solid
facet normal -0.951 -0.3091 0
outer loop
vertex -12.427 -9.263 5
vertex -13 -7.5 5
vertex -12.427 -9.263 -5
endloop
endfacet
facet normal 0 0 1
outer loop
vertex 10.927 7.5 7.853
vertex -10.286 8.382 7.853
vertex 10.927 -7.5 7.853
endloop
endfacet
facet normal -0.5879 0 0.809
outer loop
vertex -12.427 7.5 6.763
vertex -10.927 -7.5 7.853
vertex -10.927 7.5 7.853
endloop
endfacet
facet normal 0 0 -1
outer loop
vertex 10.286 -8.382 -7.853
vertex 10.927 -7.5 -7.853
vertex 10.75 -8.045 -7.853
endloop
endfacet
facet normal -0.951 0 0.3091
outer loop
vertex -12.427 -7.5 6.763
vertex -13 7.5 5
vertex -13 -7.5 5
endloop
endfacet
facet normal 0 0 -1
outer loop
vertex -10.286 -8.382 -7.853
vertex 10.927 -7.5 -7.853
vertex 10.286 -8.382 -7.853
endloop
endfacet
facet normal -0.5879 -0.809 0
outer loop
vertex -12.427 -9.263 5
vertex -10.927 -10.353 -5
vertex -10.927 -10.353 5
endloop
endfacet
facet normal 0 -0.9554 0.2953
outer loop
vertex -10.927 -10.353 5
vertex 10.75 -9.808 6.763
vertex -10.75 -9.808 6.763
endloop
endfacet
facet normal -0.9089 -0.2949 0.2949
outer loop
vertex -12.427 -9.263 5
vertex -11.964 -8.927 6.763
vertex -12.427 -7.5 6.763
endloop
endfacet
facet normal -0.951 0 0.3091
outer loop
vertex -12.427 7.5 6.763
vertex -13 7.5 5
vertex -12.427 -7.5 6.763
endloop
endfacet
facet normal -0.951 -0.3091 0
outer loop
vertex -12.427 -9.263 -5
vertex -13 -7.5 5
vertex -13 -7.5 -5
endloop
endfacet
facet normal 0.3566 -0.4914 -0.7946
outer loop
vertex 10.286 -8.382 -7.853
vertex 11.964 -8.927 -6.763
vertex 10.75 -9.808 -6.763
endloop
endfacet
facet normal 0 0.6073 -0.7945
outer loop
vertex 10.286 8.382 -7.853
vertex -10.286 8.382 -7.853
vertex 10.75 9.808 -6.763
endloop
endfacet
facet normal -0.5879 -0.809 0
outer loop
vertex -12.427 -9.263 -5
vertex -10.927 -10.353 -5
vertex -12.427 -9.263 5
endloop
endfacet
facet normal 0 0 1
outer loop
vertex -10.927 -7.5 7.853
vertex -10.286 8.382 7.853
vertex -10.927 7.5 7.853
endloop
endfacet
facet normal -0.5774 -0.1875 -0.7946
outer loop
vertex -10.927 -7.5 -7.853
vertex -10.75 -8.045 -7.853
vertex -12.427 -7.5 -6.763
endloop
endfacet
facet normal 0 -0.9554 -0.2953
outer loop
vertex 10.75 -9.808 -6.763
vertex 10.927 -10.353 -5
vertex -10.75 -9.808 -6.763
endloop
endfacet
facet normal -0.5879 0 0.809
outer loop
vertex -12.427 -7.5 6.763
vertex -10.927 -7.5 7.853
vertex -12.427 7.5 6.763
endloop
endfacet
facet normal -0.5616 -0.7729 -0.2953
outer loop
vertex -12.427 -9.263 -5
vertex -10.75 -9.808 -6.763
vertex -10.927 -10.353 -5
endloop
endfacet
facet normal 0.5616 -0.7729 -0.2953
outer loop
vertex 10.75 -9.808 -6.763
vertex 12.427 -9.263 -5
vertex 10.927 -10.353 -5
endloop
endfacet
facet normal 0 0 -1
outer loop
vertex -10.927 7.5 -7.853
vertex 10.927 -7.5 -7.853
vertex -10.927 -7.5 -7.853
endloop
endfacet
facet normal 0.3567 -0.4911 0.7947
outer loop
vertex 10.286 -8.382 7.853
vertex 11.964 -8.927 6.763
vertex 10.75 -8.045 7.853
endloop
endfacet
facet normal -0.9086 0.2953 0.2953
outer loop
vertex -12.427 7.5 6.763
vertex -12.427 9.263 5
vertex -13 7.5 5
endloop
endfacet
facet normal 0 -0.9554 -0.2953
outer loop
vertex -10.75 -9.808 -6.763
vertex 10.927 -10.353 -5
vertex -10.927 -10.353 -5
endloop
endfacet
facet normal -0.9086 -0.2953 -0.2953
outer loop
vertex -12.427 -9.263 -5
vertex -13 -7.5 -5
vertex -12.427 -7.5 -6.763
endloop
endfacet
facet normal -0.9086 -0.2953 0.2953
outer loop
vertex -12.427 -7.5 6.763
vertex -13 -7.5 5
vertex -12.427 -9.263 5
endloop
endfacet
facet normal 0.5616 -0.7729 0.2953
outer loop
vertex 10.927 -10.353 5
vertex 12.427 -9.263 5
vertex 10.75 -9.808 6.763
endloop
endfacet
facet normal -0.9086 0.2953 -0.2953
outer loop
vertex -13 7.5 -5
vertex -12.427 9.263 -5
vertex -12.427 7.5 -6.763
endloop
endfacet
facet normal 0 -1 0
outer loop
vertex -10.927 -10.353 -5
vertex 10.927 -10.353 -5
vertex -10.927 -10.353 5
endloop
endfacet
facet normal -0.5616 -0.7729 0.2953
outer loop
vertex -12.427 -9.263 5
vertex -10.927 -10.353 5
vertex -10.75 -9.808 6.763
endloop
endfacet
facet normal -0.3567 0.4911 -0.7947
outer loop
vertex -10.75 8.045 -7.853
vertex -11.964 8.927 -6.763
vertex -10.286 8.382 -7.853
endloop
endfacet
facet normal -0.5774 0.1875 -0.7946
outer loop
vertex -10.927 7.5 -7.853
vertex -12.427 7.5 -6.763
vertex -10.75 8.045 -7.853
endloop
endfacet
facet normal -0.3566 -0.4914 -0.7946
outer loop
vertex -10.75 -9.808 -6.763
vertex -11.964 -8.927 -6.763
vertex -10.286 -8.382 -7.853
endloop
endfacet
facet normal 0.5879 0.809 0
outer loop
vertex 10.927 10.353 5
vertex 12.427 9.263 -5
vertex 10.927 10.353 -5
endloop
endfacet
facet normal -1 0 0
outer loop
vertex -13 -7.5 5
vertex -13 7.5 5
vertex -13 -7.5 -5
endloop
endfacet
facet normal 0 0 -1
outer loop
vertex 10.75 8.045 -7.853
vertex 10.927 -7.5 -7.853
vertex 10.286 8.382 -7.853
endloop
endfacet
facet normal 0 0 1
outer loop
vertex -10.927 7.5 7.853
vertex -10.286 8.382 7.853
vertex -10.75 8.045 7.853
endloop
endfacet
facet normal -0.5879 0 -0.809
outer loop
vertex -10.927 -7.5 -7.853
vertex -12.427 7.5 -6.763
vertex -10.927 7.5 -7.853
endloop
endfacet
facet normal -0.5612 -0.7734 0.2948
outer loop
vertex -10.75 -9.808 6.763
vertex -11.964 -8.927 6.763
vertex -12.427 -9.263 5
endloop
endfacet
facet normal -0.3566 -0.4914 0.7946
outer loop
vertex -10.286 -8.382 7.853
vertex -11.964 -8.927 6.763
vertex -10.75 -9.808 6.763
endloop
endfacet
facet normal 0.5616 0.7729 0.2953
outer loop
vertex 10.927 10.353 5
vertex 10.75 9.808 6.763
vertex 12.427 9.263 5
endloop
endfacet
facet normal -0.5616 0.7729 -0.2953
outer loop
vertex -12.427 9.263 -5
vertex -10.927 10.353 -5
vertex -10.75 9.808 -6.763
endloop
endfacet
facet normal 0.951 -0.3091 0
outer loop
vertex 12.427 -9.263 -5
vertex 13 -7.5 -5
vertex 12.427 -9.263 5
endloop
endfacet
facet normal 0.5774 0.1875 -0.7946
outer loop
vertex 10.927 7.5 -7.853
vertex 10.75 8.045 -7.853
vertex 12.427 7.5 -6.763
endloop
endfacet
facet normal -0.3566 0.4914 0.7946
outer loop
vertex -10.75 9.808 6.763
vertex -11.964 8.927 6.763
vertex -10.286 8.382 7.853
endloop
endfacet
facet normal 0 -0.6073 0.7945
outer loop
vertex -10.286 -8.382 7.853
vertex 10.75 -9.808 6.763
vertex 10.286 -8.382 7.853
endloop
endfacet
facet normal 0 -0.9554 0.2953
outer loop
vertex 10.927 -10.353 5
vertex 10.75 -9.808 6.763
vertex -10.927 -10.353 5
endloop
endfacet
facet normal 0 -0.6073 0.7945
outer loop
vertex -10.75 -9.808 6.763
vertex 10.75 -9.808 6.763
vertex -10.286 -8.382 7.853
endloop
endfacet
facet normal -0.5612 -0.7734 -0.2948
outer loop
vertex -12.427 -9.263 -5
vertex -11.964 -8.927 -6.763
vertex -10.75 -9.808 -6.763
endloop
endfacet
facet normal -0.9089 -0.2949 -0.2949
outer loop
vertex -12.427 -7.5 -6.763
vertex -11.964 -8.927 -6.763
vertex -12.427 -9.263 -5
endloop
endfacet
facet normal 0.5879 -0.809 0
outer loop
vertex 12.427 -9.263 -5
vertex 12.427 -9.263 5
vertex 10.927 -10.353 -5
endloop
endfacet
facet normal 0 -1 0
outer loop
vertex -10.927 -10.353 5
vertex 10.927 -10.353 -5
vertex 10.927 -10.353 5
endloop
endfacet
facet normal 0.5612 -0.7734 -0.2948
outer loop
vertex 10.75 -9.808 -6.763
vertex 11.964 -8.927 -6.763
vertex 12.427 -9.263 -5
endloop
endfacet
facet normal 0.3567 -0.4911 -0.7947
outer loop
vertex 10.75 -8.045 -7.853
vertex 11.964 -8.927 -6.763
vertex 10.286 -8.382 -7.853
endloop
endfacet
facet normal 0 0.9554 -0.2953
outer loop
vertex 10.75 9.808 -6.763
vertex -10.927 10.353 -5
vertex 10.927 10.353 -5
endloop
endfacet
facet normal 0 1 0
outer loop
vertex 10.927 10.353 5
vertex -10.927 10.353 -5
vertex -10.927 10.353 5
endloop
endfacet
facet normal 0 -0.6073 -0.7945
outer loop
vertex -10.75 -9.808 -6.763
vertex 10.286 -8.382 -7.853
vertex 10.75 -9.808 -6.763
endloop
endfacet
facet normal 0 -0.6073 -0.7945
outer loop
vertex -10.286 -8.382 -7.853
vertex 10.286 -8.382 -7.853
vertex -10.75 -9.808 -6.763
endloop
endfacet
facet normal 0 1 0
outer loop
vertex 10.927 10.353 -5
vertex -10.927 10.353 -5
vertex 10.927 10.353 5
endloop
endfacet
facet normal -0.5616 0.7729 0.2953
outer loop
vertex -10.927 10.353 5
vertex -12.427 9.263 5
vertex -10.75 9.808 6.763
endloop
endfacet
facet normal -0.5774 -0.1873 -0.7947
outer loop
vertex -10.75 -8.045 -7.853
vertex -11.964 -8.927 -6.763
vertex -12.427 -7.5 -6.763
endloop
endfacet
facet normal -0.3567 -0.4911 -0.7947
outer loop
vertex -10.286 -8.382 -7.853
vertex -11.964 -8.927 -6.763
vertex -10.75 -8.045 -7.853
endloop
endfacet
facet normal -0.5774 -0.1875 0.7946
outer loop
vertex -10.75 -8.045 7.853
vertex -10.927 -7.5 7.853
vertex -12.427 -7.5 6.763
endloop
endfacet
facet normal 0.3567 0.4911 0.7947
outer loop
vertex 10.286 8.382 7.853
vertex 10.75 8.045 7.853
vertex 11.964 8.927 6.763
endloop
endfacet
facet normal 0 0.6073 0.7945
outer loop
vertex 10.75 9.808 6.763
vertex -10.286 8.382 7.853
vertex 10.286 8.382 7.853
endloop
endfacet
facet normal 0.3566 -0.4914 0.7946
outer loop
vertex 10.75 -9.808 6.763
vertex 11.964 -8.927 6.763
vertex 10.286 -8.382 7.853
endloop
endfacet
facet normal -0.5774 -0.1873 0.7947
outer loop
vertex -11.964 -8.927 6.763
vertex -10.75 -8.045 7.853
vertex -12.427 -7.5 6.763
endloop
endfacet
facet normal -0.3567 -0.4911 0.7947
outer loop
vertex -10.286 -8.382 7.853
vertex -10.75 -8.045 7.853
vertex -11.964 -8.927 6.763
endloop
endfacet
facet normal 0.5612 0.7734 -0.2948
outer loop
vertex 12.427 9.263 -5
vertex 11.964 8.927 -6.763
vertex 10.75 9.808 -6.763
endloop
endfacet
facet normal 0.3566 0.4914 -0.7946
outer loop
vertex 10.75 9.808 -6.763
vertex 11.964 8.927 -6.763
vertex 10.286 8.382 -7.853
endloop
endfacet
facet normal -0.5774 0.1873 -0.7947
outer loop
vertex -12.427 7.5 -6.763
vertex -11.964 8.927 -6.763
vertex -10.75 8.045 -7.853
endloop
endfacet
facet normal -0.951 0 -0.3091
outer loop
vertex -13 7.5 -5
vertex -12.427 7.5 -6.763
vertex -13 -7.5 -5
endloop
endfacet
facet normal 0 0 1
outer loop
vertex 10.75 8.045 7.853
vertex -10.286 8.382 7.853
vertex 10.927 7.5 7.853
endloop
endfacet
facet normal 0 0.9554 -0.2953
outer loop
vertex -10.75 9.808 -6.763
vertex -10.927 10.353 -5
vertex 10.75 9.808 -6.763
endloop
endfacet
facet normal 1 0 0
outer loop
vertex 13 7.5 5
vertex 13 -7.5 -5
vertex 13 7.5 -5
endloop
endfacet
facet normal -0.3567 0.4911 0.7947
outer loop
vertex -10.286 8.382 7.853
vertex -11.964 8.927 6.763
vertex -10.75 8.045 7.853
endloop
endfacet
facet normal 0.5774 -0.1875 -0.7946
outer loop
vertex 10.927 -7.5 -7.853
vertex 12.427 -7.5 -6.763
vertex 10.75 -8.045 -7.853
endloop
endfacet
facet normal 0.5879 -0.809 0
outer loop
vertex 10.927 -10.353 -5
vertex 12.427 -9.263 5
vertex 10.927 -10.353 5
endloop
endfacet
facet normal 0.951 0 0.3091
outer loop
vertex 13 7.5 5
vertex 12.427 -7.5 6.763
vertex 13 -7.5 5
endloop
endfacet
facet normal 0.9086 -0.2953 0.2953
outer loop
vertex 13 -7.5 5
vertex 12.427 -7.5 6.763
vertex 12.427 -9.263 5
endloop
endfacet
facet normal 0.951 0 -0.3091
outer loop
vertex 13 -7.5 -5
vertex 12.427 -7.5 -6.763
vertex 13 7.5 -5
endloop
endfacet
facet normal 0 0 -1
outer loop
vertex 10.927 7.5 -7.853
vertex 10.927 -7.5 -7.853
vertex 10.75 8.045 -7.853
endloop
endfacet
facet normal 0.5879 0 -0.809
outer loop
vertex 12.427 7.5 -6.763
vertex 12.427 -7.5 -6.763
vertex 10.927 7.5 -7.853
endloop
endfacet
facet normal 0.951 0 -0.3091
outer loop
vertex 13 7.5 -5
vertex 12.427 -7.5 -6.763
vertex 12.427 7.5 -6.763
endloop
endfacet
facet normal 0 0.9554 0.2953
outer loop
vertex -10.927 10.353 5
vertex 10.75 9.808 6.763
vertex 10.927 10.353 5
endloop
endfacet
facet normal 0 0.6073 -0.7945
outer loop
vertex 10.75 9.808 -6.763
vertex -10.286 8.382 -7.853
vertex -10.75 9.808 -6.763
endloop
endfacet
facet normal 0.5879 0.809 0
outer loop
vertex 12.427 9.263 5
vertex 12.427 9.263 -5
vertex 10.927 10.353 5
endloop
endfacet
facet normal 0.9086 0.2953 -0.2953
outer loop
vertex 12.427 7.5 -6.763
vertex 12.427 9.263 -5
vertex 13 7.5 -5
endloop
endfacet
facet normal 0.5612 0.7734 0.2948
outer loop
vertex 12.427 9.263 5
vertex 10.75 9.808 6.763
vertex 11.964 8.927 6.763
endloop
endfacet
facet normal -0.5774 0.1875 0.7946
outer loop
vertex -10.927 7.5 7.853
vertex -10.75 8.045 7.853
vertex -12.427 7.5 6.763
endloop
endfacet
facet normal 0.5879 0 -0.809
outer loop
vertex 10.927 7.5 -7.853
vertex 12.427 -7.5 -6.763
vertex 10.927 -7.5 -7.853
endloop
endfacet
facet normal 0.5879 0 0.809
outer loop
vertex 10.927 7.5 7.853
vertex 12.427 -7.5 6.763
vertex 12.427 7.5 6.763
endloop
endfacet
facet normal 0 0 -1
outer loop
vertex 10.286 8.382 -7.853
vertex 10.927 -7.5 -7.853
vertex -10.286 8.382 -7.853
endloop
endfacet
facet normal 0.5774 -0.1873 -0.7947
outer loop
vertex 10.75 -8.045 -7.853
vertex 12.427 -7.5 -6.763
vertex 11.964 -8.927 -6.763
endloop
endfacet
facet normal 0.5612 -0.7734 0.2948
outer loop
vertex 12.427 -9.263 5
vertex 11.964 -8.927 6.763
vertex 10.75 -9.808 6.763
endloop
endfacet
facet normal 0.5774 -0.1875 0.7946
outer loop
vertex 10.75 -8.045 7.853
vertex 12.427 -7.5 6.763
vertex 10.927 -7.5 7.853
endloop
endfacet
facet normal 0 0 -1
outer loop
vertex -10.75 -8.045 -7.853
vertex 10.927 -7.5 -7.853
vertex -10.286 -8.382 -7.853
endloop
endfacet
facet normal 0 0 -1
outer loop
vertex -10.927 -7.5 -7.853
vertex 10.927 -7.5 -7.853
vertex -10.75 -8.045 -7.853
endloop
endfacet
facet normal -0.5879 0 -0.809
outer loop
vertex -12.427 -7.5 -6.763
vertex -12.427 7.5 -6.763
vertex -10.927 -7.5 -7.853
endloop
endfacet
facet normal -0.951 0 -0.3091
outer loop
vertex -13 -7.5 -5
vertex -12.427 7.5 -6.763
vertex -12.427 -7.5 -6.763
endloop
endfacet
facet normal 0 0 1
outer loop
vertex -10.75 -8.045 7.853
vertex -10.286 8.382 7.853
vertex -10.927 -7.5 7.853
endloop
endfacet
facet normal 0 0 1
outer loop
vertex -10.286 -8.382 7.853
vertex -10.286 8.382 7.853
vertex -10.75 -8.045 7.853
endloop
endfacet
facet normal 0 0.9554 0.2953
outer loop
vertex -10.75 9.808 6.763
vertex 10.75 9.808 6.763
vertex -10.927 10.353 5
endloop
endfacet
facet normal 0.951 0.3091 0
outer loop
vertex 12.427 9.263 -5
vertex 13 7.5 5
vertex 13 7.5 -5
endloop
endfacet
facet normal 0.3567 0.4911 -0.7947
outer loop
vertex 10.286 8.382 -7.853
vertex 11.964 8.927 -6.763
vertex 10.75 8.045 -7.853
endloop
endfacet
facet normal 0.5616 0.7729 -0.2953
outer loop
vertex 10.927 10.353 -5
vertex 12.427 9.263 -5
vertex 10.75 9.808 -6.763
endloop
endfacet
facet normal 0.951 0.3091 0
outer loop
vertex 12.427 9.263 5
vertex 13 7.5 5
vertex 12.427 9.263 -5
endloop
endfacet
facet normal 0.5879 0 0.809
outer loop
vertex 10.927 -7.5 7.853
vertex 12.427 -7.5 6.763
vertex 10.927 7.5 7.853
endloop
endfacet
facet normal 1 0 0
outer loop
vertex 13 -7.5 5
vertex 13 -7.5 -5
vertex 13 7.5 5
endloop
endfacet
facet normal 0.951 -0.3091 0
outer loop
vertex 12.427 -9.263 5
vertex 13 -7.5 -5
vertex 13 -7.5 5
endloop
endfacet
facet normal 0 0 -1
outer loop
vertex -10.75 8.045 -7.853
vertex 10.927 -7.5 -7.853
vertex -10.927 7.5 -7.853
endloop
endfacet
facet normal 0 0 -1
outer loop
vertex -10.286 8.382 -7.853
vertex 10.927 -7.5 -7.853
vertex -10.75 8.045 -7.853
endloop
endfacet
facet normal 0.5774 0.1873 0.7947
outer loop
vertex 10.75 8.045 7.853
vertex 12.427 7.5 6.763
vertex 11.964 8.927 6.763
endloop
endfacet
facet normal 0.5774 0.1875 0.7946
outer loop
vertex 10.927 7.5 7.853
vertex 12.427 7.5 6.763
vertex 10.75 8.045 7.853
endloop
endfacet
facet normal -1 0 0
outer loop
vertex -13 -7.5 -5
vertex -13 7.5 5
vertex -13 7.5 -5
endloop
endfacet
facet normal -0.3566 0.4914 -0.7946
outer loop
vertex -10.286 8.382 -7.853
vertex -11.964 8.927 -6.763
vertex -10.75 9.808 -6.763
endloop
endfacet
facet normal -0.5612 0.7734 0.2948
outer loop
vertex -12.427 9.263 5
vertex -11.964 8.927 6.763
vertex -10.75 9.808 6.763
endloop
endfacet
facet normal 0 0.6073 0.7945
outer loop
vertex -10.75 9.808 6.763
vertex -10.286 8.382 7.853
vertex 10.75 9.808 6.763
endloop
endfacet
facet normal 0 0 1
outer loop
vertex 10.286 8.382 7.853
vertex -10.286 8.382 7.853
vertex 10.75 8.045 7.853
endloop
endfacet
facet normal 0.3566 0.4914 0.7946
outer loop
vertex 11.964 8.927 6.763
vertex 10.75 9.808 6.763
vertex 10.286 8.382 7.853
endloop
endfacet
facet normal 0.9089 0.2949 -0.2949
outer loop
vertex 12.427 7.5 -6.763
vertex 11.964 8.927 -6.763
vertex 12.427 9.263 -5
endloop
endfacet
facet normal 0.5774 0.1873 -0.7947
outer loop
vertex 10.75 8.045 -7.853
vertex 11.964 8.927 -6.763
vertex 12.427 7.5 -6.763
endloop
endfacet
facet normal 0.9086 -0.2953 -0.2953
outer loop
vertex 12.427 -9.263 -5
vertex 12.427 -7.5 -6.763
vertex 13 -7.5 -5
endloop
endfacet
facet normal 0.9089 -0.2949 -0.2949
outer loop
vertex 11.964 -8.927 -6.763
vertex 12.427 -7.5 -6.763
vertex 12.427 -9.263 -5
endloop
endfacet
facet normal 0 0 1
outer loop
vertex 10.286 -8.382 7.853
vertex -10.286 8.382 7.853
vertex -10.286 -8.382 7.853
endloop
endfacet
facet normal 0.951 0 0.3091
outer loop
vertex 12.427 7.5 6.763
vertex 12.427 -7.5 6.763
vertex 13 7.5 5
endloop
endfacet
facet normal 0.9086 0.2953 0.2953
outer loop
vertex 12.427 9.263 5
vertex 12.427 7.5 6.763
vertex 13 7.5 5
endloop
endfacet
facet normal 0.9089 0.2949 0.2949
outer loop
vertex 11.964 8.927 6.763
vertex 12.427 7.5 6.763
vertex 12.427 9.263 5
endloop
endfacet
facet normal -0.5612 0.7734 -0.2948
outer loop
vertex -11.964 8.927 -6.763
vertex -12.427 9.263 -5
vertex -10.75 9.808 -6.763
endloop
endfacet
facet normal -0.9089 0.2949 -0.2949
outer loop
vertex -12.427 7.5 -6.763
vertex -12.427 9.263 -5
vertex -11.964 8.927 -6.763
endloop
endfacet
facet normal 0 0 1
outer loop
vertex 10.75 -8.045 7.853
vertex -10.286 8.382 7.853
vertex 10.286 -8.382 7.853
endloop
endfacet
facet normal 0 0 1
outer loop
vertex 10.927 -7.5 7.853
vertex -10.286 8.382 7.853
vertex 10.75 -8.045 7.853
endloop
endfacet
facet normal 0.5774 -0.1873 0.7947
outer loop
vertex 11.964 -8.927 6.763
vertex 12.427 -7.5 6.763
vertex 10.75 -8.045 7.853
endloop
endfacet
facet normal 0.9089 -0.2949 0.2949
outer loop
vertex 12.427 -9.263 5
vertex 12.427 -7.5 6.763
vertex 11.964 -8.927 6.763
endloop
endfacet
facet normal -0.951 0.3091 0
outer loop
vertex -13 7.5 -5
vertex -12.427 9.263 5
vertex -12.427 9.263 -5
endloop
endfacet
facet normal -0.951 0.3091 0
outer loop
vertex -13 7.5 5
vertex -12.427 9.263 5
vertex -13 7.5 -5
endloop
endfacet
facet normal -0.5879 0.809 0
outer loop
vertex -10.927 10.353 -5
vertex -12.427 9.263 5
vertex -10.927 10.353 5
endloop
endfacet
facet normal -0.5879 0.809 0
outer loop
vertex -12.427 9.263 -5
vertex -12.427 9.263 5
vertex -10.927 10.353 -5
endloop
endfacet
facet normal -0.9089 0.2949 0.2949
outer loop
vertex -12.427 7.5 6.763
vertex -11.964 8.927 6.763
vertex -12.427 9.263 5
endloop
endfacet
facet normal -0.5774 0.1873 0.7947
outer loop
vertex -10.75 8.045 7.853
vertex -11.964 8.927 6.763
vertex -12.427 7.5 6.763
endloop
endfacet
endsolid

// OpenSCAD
// Rung 2: hull() of 8 equal-radius spheres at box corners -> exact analytic
// offset(convex_hull_of_centers, r).
hull() {
    translate([-10,-7.5,-5]) sphere(r=3);
    translate([10,-7.5,-5]) sphere(r=3);
    translate([-10,7.5,-5]) sphere(r=3);
    translate([10,7.5,-5]) sphere(r=3);
    translate([-10,-7.5,5]) sphere(r=3);
    translate([10,-7.5,5]) sphere(r=3);
    translate([-10,7.5,5]) sphere(r=3);
    translate([10,7.5,5]) sphere(r=3);
}
